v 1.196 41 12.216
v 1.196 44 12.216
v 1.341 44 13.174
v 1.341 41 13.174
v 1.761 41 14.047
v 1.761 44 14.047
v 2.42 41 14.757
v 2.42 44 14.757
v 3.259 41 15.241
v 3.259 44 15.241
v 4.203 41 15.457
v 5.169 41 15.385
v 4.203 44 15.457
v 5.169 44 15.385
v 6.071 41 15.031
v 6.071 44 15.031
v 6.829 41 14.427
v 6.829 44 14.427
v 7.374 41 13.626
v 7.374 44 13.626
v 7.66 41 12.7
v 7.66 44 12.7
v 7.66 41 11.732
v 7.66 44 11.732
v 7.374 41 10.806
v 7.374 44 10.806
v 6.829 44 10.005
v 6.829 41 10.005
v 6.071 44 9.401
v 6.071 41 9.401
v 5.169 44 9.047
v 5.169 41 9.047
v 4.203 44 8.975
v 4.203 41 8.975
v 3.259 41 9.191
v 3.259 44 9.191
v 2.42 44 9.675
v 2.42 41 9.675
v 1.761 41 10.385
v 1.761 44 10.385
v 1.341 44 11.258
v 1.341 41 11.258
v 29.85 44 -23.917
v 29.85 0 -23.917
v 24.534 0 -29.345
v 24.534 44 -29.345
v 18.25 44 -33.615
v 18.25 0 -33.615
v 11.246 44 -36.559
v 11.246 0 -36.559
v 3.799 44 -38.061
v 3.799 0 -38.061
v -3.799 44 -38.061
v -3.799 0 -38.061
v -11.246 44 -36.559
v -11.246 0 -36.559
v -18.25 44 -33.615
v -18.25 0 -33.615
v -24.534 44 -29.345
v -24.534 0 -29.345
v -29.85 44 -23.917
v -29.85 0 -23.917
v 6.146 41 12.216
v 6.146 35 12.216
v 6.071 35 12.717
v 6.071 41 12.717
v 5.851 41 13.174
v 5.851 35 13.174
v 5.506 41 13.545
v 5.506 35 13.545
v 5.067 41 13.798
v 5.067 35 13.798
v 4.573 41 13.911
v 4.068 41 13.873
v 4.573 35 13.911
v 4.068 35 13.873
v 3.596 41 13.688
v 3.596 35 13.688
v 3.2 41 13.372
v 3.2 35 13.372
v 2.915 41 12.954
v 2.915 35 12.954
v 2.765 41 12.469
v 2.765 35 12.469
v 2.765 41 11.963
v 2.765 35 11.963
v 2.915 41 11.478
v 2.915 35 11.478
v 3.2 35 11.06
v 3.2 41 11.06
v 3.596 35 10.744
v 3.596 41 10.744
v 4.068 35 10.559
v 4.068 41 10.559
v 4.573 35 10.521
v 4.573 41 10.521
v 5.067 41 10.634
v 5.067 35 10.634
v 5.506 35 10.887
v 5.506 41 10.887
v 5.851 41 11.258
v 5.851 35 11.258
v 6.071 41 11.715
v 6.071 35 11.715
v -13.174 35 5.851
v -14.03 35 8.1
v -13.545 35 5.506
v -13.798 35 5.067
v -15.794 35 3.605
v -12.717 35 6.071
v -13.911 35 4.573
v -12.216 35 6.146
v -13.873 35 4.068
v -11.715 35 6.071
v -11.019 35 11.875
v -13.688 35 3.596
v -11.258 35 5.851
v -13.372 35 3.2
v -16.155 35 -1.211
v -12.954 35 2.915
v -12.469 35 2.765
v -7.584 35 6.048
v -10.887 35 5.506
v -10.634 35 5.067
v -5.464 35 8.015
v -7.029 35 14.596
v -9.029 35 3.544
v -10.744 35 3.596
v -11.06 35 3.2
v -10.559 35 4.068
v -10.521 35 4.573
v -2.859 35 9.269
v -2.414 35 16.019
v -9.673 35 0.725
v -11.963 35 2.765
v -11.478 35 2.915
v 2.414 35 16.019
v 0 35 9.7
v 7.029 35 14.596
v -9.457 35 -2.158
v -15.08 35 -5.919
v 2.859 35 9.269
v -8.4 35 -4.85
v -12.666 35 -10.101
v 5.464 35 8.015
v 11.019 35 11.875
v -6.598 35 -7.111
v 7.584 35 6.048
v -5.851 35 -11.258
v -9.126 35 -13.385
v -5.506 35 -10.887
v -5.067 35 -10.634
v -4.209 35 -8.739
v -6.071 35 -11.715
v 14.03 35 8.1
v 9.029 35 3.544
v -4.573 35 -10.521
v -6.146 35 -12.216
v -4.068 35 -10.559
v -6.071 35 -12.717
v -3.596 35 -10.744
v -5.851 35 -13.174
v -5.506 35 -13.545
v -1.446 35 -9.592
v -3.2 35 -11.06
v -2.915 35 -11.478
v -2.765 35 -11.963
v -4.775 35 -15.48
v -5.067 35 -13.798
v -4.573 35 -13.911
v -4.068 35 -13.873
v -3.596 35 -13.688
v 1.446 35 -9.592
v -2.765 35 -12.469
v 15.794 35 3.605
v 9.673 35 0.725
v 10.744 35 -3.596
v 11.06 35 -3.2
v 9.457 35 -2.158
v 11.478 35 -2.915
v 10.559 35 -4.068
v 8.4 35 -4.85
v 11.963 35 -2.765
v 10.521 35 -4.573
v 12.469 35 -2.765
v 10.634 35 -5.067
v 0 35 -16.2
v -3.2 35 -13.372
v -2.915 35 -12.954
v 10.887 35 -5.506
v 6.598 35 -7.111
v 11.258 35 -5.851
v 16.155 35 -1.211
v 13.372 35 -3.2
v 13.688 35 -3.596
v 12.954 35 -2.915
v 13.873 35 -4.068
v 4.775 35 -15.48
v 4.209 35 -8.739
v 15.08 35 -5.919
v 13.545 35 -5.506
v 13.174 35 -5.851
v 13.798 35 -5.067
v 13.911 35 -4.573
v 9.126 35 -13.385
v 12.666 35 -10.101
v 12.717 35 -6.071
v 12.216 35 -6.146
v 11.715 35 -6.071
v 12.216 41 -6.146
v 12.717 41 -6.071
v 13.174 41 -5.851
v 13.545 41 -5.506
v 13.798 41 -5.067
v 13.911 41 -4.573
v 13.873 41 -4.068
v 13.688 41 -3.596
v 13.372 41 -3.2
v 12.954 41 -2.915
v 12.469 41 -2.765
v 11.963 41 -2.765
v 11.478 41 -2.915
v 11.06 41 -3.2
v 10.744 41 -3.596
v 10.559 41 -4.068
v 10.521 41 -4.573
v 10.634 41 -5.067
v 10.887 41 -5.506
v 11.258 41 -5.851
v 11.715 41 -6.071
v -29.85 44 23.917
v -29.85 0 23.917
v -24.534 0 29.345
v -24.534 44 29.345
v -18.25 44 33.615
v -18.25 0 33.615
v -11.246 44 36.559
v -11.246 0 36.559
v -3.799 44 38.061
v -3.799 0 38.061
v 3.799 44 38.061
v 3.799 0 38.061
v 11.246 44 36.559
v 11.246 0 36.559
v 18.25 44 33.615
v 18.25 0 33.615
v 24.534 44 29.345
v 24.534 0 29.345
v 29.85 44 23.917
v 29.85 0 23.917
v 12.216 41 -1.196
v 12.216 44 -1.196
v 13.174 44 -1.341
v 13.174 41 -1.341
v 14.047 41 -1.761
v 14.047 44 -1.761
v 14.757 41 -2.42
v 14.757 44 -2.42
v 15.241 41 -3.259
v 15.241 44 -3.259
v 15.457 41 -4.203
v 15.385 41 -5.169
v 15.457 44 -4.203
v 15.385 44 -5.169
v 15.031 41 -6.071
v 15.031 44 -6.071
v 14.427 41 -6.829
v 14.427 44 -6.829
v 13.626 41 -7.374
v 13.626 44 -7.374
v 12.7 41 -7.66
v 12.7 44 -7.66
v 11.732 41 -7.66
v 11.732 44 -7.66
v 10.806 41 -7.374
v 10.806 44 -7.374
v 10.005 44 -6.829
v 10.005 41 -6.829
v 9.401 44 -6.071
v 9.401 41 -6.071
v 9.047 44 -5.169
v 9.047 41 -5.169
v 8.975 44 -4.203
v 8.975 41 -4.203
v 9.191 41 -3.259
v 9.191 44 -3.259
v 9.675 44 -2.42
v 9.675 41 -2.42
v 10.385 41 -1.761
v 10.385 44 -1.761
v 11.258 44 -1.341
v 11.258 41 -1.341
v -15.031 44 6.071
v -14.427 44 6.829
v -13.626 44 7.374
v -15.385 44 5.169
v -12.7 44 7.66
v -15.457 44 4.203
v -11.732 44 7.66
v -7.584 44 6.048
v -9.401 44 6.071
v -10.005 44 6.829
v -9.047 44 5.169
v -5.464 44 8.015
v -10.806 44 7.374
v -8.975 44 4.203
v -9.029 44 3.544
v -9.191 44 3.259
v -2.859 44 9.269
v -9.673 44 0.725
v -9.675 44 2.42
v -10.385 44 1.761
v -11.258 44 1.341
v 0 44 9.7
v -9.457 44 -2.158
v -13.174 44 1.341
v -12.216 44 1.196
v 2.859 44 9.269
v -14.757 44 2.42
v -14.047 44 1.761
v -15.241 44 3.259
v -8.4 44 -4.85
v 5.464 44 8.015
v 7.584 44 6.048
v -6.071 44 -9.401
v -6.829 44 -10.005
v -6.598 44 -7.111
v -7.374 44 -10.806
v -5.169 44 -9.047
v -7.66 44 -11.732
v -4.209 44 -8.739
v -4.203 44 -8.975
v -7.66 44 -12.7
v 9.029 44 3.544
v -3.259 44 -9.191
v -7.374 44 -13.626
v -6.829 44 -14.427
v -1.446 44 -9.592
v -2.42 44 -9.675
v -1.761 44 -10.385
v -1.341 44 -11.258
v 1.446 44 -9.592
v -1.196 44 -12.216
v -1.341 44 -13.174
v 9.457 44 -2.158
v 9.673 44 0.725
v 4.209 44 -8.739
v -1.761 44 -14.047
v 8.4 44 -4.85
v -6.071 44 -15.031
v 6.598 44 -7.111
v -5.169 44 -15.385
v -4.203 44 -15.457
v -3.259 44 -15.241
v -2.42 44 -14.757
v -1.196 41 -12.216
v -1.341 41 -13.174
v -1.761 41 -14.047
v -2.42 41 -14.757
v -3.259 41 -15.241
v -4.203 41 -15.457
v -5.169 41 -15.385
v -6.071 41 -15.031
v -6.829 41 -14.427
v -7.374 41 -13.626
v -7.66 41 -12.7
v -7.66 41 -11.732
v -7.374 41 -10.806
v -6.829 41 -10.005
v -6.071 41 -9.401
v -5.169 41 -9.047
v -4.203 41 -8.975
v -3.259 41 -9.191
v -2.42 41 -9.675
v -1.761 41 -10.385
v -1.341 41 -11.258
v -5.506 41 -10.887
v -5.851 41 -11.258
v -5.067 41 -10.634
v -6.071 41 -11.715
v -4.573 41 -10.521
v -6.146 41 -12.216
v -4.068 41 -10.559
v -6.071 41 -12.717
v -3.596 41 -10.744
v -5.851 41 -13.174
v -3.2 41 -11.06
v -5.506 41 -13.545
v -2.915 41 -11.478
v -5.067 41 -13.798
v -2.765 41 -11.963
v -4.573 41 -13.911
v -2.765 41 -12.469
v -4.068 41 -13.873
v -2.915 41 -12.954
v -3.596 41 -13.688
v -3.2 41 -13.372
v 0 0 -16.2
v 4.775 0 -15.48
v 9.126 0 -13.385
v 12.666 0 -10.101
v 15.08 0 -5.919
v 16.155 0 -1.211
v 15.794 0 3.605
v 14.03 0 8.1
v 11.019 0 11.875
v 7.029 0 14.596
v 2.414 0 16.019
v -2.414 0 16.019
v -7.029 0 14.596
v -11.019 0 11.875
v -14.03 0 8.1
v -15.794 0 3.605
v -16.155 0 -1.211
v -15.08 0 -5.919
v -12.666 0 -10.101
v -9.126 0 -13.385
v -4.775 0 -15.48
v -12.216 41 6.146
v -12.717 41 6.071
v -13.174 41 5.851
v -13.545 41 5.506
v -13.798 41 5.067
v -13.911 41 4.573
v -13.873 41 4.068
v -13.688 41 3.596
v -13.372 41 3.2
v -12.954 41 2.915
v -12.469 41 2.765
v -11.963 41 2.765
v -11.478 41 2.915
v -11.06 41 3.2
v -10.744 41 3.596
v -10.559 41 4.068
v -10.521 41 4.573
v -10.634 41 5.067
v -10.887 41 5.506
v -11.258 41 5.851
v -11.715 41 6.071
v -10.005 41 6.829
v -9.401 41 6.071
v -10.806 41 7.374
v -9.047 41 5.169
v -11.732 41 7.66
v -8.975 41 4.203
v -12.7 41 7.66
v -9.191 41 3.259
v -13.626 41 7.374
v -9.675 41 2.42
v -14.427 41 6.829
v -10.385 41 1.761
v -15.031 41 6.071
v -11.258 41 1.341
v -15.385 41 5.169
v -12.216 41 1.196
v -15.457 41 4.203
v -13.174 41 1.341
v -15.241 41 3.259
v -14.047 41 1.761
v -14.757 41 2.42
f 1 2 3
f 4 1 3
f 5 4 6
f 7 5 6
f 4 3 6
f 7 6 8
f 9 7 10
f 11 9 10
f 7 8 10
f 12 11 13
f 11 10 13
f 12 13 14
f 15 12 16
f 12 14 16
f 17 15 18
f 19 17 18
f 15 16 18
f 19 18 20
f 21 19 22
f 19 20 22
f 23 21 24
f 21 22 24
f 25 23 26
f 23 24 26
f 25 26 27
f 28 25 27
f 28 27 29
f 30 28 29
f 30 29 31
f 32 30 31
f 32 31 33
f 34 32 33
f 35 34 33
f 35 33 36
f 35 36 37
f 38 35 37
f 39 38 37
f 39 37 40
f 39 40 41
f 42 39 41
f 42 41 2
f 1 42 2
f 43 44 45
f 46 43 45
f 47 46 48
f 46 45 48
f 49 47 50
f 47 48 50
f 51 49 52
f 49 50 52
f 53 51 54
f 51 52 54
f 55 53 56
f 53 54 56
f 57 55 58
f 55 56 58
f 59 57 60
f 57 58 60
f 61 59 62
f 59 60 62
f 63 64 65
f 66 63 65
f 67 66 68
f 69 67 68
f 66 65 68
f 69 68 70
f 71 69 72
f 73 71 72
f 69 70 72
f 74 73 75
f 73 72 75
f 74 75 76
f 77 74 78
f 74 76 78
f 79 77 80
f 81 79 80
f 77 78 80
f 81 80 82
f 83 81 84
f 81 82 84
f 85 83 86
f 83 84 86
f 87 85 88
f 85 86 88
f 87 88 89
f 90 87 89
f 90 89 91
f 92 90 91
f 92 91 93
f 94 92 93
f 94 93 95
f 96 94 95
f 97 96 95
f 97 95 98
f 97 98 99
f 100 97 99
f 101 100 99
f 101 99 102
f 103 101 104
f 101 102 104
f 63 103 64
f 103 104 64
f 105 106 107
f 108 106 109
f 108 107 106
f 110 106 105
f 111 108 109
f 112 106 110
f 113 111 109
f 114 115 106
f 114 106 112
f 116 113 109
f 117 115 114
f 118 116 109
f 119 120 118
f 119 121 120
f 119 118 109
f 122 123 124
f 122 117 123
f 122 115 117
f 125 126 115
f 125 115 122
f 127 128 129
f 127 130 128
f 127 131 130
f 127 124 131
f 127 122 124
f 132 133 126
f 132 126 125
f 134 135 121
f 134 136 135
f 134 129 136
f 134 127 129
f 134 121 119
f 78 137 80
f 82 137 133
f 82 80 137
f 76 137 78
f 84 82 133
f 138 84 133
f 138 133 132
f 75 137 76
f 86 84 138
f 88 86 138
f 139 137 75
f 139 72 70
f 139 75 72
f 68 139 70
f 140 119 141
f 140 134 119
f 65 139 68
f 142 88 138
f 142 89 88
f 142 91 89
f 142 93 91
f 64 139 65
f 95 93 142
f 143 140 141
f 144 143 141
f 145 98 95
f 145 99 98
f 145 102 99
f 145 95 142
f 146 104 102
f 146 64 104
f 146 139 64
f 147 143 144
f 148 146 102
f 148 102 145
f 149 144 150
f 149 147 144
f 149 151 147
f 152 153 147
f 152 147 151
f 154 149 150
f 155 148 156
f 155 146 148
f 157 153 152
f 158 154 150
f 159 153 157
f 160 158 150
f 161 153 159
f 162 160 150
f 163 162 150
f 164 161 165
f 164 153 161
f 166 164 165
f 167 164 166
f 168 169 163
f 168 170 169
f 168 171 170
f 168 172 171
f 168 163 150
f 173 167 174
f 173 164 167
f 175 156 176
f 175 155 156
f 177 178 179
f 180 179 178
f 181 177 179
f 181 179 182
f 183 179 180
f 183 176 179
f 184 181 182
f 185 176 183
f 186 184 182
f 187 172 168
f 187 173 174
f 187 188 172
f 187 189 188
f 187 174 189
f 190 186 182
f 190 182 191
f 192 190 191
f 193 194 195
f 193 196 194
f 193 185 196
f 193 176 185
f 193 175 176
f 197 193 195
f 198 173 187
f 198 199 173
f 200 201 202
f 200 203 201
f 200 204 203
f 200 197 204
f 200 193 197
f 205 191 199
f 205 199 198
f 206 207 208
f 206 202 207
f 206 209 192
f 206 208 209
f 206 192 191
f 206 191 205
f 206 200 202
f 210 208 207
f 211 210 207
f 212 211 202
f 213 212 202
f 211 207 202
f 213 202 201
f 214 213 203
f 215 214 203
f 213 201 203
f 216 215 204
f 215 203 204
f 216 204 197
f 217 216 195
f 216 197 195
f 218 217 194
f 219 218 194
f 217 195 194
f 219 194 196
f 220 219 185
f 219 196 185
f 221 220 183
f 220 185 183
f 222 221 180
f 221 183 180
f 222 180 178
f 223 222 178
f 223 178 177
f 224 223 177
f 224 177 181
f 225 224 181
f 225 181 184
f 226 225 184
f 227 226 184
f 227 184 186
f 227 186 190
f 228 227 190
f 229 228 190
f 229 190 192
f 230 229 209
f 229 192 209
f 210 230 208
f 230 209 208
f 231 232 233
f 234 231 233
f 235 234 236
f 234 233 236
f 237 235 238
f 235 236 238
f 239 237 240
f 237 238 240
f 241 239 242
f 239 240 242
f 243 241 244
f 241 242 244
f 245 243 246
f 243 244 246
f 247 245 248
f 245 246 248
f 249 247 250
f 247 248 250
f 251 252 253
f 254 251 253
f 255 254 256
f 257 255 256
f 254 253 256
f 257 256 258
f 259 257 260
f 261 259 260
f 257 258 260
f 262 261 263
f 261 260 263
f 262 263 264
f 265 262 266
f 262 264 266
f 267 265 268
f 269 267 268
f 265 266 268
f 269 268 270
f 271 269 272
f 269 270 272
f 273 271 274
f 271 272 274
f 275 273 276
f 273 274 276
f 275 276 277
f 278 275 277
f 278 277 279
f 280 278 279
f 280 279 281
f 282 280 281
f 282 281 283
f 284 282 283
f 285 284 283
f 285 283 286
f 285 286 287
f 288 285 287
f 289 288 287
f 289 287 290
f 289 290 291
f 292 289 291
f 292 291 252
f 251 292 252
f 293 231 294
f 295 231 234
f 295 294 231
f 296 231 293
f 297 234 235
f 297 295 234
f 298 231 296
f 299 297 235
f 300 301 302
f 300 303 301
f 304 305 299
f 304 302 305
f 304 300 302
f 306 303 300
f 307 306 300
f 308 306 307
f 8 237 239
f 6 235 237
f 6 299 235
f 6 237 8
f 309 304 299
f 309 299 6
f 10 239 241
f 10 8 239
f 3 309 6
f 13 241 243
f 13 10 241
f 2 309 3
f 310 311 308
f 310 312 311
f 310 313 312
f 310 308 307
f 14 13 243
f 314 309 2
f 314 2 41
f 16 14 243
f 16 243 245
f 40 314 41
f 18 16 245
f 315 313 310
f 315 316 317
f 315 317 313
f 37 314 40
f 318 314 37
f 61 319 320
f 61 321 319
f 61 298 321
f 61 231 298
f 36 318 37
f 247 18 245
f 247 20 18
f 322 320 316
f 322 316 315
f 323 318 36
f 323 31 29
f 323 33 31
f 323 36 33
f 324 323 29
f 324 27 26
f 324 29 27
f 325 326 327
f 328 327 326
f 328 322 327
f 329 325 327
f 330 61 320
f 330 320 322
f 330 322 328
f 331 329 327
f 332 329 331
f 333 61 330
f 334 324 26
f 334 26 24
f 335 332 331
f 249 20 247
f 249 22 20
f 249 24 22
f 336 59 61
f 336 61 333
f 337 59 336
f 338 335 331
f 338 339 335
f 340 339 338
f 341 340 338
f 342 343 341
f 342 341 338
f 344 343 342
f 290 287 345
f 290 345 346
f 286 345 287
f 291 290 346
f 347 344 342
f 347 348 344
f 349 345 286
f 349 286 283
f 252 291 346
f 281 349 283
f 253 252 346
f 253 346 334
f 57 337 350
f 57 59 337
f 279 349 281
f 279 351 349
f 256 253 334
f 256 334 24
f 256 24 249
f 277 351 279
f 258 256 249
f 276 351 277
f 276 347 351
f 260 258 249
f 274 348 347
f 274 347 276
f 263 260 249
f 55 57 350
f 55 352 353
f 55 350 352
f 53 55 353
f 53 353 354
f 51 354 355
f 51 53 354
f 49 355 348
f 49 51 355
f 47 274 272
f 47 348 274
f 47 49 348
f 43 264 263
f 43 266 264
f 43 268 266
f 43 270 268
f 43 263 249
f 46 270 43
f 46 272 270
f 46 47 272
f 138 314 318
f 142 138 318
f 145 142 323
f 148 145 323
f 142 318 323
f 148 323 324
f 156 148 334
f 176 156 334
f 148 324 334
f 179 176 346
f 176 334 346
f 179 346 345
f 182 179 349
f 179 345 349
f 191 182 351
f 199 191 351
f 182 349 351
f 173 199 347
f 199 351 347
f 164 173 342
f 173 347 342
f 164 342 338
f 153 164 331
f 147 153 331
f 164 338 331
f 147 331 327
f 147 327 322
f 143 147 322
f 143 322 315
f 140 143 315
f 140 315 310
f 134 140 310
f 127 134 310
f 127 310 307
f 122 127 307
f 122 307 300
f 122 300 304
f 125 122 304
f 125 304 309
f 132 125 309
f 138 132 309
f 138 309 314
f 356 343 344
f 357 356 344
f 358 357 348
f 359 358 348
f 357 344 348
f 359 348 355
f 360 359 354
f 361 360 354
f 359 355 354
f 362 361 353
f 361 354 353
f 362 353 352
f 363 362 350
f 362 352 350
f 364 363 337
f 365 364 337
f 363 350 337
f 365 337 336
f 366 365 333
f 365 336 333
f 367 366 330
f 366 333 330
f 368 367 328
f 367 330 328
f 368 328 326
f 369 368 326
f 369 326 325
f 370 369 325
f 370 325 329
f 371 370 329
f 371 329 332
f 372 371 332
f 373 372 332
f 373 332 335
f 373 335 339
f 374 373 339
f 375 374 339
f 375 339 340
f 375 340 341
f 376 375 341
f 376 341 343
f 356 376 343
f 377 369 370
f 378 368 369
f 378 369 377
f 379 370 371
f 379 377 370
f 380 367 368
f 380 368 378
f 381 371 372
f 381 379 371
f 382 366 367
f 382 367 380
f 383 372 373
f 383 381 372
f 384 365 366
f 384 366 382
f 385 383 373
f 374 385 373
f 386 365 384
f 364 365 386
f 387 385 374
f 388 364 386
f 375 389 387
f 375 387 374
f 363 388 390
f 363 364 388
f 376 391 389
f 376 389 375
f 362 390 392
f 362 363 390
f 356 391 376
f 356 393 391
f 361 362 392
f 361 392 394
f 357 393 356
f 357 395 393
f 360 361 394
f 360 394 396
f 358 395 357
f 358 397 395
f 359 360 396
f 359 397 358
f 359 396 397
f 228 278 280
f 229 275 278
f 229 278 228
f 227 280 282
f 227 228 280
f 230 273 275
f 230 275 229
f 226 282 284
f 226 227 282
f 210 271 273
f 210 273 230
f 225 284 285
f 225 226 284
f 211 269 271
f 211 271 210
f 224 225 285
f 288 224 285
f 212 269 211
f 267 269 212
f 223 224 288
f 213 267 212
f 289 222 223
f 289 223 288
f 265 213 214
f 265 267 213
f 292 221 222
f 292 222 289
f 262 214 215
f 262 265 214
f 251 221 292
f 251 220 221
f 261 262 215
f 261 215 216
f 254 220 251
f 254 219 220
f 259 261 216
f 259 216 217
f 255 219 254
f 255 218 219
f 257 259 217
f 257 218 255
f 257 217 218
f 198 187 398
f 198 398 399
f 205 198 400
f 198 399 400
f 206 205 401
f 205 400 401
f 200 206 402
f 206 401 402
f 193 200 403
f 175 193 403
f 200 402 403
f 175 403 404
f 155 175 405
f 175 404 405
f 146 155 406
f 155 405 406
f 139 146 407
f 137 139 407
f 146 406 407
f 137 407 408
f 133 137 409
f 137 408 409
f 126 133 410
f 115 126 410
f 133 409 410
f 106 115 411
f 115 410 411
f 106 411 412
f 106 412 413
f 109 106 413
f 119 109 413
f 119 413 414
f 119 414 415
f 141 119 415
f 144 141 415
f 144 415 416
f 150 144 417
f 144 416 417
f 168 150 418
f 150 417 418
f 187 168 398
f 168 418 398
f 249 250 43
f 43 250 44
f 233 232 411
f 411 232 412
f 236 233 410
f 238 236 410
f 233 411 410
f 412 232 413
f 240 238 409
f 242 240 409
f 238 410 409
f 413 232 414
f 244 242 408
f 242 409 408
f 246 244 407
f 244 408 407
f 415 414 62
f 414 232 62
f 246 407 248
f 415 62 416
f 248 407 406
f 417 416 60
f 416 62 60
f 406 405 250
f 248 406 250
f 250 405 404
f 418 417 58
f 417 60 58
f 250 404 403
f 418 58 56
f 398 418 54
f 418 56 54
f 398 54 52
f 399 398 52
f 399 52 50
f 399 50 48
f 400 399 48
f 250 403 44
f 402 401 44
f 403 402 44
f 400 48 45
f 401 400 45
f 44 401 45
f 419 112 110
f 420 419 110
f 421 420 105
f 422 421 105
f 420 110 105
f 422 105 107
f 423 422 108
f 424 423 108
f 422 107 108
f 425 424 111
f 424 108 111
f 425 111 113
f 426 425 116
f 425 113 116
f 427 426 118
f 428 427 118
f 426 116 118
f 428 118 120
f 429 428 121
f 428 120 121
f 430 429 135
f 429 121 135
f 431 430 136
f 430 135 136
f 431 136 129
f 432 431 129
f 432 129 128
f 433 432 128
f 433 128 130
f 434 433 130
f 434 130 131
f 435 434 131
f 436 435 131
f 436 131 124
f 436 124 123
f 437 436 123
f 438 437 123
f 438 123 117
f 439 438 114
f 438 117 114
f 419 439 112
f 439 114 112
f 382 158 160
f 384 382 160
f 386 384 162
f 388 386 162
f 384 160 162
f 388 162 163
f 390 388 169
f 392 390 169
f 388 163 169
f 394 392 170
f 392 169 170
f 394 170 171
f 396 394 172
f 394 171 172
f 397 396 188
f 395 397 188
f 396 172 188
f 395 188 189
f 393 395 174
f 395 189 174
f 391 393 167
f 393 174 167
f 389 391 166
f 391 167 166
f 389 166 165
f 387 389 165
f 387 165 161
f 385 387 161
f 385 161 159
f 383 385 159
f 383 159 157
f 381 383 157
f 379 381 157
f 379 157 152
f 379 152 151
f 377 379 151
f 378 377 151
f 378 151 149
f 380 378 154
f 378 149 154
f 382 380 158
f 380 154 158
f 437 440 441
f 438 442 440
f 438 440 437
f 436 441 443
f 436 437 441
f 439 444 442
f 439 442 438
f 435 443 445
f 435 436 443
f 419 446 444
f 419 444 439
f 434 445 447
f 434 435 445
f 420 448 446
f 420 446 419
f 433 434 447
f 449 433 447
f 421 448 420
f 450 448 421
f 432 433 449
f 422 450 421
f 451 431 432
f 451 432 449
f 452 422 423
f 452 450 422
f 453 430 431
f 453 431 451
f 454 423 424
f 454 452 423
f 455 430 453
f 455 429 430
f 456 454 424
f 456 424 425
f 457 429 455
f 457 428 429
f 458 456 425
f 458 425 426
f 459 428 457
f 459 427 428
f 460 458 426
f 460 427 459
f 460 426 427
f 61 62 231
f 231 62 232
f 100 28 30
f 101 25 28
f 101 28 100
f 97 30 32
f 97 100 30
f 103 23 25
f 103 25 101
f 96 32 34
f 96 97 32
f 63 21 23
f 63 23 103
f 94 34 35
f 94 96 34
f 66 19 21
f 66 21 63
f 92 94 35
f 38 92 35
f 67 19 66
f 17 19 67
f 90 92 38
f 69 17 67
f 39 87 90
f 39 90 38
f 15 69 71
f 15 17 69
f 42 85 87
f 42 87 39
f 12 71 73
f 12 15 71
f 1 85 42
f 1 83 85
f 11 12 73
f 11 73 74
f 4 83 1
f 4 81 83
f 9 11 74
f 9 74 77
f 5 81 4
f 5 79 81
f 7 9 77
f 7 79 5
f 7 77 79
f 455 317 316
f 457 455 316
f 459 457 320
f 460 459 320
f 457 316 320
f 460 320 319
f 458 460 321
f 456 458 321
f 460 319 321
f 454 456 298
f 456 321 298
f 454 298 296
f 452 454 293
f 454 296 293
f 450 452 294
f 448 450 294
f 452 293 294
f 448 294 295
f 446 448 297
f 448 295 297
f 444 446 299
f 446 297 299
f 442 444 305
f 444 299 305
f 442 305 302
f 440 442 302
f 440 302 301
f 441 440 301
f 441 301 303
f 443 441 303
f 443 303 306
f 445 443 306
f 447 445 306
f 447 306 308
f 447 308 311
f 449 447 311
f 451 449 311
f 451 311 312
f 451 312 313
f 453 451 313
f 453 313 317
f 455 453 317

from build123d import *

# Parameters (mm, degrees)
BOSS_EXTRUDE1_DEPTH            = 44
CBORE_FOR_M3_SHCS1_D           = 3.4
CBORE_FOR_M3_SHCS1_CBORE_D     = 6.5
CBORE_FOR_M3_SHCS1_CBORE_DEPTH = 3
CIRPATTERN1_COUNT              = 4
SKETCH4_R                      = 16.2
CUT_EXTRUDE1_DEPTH             = 35
SKETCH5_R                      = 9.7
CUT_EXTRUDE2_DEPTH             = 66.498740446


with BuildPart() as part:
    # Sketch1 → Boss-Extrude1 (new body)
    with BuildSketch(Plane(origin=(0, 0, 0), x_dir=(1, 0, 0), z_dir=(0, 1, 0))):
        with BuildLine():
            Line((-29.85, 23.917357714), (-29.85, -23.917357714))
            ThreePointArc((-29.85, -23.917357714), (0, -38.25), (29.85, -23.917357714))
            Line((29.85, -23.917357714), (29.85, 23.917357714))
            ThreePointArc((29.85, 23.917357714), (0, 38.25), (-29.85, 23.917357714))
        make_face()
    extrude(amount=BOSS_EXTRUDE1_DEPTH)

    # CBORE for M3 SHCS1 (through all)
    with Locations(Plane(origin=(0, 44, 0), x_dir=(1, 0, 0), z_dir=(0, 1, 0))):
        with Locations((-4.446261863, 12.21600407)):
            cbore_for_m3_shcs1 = CounterBoreHole(CBORE_FOR_M3_SHCS1_D / 2, CBORE_FOR_M3_SHCS1_CBORE_D / 2, CBORE_FOR_M3_SHCS1_CBORE_DEPTH)

    # CirPattern1: CBORE for M3 SHCS1 ×4 about axis
    cirpattern1_axis = Axis((0, 44, 0), (0, -1, 0))
    for i in range(1, CIRPATTERN1_COUNT):
        add(cbore_for_m3_shcs1.rotate(cirpattern1_axis, i * 360 / CIRPATTERN1_COUNT), mode=Mode.SUBTRACT)

    # Sketch4 → Cut-Extrude1 (cut)
    with BuildSketch(Plane.XZ):
        Circle(SKETCH4_R)
    extrude(amount=-CUT_EXTRUDE1_DEPTH, mode=Mode.SUBTRACT)

    # Sketch5 → Cut-Extrude2 (cut, through all)
    with BuildSketch(Plane(origin=(0, 44, 0), x_dir=(1, 0, 0), z_dir=(0, 1, 0))):
        Circle(SKETCH5_R)
    extrude(amount=-CUT_EXTRUDE2_DEPTH, mode=Mode.SUBTRACT)


solid = part.part
